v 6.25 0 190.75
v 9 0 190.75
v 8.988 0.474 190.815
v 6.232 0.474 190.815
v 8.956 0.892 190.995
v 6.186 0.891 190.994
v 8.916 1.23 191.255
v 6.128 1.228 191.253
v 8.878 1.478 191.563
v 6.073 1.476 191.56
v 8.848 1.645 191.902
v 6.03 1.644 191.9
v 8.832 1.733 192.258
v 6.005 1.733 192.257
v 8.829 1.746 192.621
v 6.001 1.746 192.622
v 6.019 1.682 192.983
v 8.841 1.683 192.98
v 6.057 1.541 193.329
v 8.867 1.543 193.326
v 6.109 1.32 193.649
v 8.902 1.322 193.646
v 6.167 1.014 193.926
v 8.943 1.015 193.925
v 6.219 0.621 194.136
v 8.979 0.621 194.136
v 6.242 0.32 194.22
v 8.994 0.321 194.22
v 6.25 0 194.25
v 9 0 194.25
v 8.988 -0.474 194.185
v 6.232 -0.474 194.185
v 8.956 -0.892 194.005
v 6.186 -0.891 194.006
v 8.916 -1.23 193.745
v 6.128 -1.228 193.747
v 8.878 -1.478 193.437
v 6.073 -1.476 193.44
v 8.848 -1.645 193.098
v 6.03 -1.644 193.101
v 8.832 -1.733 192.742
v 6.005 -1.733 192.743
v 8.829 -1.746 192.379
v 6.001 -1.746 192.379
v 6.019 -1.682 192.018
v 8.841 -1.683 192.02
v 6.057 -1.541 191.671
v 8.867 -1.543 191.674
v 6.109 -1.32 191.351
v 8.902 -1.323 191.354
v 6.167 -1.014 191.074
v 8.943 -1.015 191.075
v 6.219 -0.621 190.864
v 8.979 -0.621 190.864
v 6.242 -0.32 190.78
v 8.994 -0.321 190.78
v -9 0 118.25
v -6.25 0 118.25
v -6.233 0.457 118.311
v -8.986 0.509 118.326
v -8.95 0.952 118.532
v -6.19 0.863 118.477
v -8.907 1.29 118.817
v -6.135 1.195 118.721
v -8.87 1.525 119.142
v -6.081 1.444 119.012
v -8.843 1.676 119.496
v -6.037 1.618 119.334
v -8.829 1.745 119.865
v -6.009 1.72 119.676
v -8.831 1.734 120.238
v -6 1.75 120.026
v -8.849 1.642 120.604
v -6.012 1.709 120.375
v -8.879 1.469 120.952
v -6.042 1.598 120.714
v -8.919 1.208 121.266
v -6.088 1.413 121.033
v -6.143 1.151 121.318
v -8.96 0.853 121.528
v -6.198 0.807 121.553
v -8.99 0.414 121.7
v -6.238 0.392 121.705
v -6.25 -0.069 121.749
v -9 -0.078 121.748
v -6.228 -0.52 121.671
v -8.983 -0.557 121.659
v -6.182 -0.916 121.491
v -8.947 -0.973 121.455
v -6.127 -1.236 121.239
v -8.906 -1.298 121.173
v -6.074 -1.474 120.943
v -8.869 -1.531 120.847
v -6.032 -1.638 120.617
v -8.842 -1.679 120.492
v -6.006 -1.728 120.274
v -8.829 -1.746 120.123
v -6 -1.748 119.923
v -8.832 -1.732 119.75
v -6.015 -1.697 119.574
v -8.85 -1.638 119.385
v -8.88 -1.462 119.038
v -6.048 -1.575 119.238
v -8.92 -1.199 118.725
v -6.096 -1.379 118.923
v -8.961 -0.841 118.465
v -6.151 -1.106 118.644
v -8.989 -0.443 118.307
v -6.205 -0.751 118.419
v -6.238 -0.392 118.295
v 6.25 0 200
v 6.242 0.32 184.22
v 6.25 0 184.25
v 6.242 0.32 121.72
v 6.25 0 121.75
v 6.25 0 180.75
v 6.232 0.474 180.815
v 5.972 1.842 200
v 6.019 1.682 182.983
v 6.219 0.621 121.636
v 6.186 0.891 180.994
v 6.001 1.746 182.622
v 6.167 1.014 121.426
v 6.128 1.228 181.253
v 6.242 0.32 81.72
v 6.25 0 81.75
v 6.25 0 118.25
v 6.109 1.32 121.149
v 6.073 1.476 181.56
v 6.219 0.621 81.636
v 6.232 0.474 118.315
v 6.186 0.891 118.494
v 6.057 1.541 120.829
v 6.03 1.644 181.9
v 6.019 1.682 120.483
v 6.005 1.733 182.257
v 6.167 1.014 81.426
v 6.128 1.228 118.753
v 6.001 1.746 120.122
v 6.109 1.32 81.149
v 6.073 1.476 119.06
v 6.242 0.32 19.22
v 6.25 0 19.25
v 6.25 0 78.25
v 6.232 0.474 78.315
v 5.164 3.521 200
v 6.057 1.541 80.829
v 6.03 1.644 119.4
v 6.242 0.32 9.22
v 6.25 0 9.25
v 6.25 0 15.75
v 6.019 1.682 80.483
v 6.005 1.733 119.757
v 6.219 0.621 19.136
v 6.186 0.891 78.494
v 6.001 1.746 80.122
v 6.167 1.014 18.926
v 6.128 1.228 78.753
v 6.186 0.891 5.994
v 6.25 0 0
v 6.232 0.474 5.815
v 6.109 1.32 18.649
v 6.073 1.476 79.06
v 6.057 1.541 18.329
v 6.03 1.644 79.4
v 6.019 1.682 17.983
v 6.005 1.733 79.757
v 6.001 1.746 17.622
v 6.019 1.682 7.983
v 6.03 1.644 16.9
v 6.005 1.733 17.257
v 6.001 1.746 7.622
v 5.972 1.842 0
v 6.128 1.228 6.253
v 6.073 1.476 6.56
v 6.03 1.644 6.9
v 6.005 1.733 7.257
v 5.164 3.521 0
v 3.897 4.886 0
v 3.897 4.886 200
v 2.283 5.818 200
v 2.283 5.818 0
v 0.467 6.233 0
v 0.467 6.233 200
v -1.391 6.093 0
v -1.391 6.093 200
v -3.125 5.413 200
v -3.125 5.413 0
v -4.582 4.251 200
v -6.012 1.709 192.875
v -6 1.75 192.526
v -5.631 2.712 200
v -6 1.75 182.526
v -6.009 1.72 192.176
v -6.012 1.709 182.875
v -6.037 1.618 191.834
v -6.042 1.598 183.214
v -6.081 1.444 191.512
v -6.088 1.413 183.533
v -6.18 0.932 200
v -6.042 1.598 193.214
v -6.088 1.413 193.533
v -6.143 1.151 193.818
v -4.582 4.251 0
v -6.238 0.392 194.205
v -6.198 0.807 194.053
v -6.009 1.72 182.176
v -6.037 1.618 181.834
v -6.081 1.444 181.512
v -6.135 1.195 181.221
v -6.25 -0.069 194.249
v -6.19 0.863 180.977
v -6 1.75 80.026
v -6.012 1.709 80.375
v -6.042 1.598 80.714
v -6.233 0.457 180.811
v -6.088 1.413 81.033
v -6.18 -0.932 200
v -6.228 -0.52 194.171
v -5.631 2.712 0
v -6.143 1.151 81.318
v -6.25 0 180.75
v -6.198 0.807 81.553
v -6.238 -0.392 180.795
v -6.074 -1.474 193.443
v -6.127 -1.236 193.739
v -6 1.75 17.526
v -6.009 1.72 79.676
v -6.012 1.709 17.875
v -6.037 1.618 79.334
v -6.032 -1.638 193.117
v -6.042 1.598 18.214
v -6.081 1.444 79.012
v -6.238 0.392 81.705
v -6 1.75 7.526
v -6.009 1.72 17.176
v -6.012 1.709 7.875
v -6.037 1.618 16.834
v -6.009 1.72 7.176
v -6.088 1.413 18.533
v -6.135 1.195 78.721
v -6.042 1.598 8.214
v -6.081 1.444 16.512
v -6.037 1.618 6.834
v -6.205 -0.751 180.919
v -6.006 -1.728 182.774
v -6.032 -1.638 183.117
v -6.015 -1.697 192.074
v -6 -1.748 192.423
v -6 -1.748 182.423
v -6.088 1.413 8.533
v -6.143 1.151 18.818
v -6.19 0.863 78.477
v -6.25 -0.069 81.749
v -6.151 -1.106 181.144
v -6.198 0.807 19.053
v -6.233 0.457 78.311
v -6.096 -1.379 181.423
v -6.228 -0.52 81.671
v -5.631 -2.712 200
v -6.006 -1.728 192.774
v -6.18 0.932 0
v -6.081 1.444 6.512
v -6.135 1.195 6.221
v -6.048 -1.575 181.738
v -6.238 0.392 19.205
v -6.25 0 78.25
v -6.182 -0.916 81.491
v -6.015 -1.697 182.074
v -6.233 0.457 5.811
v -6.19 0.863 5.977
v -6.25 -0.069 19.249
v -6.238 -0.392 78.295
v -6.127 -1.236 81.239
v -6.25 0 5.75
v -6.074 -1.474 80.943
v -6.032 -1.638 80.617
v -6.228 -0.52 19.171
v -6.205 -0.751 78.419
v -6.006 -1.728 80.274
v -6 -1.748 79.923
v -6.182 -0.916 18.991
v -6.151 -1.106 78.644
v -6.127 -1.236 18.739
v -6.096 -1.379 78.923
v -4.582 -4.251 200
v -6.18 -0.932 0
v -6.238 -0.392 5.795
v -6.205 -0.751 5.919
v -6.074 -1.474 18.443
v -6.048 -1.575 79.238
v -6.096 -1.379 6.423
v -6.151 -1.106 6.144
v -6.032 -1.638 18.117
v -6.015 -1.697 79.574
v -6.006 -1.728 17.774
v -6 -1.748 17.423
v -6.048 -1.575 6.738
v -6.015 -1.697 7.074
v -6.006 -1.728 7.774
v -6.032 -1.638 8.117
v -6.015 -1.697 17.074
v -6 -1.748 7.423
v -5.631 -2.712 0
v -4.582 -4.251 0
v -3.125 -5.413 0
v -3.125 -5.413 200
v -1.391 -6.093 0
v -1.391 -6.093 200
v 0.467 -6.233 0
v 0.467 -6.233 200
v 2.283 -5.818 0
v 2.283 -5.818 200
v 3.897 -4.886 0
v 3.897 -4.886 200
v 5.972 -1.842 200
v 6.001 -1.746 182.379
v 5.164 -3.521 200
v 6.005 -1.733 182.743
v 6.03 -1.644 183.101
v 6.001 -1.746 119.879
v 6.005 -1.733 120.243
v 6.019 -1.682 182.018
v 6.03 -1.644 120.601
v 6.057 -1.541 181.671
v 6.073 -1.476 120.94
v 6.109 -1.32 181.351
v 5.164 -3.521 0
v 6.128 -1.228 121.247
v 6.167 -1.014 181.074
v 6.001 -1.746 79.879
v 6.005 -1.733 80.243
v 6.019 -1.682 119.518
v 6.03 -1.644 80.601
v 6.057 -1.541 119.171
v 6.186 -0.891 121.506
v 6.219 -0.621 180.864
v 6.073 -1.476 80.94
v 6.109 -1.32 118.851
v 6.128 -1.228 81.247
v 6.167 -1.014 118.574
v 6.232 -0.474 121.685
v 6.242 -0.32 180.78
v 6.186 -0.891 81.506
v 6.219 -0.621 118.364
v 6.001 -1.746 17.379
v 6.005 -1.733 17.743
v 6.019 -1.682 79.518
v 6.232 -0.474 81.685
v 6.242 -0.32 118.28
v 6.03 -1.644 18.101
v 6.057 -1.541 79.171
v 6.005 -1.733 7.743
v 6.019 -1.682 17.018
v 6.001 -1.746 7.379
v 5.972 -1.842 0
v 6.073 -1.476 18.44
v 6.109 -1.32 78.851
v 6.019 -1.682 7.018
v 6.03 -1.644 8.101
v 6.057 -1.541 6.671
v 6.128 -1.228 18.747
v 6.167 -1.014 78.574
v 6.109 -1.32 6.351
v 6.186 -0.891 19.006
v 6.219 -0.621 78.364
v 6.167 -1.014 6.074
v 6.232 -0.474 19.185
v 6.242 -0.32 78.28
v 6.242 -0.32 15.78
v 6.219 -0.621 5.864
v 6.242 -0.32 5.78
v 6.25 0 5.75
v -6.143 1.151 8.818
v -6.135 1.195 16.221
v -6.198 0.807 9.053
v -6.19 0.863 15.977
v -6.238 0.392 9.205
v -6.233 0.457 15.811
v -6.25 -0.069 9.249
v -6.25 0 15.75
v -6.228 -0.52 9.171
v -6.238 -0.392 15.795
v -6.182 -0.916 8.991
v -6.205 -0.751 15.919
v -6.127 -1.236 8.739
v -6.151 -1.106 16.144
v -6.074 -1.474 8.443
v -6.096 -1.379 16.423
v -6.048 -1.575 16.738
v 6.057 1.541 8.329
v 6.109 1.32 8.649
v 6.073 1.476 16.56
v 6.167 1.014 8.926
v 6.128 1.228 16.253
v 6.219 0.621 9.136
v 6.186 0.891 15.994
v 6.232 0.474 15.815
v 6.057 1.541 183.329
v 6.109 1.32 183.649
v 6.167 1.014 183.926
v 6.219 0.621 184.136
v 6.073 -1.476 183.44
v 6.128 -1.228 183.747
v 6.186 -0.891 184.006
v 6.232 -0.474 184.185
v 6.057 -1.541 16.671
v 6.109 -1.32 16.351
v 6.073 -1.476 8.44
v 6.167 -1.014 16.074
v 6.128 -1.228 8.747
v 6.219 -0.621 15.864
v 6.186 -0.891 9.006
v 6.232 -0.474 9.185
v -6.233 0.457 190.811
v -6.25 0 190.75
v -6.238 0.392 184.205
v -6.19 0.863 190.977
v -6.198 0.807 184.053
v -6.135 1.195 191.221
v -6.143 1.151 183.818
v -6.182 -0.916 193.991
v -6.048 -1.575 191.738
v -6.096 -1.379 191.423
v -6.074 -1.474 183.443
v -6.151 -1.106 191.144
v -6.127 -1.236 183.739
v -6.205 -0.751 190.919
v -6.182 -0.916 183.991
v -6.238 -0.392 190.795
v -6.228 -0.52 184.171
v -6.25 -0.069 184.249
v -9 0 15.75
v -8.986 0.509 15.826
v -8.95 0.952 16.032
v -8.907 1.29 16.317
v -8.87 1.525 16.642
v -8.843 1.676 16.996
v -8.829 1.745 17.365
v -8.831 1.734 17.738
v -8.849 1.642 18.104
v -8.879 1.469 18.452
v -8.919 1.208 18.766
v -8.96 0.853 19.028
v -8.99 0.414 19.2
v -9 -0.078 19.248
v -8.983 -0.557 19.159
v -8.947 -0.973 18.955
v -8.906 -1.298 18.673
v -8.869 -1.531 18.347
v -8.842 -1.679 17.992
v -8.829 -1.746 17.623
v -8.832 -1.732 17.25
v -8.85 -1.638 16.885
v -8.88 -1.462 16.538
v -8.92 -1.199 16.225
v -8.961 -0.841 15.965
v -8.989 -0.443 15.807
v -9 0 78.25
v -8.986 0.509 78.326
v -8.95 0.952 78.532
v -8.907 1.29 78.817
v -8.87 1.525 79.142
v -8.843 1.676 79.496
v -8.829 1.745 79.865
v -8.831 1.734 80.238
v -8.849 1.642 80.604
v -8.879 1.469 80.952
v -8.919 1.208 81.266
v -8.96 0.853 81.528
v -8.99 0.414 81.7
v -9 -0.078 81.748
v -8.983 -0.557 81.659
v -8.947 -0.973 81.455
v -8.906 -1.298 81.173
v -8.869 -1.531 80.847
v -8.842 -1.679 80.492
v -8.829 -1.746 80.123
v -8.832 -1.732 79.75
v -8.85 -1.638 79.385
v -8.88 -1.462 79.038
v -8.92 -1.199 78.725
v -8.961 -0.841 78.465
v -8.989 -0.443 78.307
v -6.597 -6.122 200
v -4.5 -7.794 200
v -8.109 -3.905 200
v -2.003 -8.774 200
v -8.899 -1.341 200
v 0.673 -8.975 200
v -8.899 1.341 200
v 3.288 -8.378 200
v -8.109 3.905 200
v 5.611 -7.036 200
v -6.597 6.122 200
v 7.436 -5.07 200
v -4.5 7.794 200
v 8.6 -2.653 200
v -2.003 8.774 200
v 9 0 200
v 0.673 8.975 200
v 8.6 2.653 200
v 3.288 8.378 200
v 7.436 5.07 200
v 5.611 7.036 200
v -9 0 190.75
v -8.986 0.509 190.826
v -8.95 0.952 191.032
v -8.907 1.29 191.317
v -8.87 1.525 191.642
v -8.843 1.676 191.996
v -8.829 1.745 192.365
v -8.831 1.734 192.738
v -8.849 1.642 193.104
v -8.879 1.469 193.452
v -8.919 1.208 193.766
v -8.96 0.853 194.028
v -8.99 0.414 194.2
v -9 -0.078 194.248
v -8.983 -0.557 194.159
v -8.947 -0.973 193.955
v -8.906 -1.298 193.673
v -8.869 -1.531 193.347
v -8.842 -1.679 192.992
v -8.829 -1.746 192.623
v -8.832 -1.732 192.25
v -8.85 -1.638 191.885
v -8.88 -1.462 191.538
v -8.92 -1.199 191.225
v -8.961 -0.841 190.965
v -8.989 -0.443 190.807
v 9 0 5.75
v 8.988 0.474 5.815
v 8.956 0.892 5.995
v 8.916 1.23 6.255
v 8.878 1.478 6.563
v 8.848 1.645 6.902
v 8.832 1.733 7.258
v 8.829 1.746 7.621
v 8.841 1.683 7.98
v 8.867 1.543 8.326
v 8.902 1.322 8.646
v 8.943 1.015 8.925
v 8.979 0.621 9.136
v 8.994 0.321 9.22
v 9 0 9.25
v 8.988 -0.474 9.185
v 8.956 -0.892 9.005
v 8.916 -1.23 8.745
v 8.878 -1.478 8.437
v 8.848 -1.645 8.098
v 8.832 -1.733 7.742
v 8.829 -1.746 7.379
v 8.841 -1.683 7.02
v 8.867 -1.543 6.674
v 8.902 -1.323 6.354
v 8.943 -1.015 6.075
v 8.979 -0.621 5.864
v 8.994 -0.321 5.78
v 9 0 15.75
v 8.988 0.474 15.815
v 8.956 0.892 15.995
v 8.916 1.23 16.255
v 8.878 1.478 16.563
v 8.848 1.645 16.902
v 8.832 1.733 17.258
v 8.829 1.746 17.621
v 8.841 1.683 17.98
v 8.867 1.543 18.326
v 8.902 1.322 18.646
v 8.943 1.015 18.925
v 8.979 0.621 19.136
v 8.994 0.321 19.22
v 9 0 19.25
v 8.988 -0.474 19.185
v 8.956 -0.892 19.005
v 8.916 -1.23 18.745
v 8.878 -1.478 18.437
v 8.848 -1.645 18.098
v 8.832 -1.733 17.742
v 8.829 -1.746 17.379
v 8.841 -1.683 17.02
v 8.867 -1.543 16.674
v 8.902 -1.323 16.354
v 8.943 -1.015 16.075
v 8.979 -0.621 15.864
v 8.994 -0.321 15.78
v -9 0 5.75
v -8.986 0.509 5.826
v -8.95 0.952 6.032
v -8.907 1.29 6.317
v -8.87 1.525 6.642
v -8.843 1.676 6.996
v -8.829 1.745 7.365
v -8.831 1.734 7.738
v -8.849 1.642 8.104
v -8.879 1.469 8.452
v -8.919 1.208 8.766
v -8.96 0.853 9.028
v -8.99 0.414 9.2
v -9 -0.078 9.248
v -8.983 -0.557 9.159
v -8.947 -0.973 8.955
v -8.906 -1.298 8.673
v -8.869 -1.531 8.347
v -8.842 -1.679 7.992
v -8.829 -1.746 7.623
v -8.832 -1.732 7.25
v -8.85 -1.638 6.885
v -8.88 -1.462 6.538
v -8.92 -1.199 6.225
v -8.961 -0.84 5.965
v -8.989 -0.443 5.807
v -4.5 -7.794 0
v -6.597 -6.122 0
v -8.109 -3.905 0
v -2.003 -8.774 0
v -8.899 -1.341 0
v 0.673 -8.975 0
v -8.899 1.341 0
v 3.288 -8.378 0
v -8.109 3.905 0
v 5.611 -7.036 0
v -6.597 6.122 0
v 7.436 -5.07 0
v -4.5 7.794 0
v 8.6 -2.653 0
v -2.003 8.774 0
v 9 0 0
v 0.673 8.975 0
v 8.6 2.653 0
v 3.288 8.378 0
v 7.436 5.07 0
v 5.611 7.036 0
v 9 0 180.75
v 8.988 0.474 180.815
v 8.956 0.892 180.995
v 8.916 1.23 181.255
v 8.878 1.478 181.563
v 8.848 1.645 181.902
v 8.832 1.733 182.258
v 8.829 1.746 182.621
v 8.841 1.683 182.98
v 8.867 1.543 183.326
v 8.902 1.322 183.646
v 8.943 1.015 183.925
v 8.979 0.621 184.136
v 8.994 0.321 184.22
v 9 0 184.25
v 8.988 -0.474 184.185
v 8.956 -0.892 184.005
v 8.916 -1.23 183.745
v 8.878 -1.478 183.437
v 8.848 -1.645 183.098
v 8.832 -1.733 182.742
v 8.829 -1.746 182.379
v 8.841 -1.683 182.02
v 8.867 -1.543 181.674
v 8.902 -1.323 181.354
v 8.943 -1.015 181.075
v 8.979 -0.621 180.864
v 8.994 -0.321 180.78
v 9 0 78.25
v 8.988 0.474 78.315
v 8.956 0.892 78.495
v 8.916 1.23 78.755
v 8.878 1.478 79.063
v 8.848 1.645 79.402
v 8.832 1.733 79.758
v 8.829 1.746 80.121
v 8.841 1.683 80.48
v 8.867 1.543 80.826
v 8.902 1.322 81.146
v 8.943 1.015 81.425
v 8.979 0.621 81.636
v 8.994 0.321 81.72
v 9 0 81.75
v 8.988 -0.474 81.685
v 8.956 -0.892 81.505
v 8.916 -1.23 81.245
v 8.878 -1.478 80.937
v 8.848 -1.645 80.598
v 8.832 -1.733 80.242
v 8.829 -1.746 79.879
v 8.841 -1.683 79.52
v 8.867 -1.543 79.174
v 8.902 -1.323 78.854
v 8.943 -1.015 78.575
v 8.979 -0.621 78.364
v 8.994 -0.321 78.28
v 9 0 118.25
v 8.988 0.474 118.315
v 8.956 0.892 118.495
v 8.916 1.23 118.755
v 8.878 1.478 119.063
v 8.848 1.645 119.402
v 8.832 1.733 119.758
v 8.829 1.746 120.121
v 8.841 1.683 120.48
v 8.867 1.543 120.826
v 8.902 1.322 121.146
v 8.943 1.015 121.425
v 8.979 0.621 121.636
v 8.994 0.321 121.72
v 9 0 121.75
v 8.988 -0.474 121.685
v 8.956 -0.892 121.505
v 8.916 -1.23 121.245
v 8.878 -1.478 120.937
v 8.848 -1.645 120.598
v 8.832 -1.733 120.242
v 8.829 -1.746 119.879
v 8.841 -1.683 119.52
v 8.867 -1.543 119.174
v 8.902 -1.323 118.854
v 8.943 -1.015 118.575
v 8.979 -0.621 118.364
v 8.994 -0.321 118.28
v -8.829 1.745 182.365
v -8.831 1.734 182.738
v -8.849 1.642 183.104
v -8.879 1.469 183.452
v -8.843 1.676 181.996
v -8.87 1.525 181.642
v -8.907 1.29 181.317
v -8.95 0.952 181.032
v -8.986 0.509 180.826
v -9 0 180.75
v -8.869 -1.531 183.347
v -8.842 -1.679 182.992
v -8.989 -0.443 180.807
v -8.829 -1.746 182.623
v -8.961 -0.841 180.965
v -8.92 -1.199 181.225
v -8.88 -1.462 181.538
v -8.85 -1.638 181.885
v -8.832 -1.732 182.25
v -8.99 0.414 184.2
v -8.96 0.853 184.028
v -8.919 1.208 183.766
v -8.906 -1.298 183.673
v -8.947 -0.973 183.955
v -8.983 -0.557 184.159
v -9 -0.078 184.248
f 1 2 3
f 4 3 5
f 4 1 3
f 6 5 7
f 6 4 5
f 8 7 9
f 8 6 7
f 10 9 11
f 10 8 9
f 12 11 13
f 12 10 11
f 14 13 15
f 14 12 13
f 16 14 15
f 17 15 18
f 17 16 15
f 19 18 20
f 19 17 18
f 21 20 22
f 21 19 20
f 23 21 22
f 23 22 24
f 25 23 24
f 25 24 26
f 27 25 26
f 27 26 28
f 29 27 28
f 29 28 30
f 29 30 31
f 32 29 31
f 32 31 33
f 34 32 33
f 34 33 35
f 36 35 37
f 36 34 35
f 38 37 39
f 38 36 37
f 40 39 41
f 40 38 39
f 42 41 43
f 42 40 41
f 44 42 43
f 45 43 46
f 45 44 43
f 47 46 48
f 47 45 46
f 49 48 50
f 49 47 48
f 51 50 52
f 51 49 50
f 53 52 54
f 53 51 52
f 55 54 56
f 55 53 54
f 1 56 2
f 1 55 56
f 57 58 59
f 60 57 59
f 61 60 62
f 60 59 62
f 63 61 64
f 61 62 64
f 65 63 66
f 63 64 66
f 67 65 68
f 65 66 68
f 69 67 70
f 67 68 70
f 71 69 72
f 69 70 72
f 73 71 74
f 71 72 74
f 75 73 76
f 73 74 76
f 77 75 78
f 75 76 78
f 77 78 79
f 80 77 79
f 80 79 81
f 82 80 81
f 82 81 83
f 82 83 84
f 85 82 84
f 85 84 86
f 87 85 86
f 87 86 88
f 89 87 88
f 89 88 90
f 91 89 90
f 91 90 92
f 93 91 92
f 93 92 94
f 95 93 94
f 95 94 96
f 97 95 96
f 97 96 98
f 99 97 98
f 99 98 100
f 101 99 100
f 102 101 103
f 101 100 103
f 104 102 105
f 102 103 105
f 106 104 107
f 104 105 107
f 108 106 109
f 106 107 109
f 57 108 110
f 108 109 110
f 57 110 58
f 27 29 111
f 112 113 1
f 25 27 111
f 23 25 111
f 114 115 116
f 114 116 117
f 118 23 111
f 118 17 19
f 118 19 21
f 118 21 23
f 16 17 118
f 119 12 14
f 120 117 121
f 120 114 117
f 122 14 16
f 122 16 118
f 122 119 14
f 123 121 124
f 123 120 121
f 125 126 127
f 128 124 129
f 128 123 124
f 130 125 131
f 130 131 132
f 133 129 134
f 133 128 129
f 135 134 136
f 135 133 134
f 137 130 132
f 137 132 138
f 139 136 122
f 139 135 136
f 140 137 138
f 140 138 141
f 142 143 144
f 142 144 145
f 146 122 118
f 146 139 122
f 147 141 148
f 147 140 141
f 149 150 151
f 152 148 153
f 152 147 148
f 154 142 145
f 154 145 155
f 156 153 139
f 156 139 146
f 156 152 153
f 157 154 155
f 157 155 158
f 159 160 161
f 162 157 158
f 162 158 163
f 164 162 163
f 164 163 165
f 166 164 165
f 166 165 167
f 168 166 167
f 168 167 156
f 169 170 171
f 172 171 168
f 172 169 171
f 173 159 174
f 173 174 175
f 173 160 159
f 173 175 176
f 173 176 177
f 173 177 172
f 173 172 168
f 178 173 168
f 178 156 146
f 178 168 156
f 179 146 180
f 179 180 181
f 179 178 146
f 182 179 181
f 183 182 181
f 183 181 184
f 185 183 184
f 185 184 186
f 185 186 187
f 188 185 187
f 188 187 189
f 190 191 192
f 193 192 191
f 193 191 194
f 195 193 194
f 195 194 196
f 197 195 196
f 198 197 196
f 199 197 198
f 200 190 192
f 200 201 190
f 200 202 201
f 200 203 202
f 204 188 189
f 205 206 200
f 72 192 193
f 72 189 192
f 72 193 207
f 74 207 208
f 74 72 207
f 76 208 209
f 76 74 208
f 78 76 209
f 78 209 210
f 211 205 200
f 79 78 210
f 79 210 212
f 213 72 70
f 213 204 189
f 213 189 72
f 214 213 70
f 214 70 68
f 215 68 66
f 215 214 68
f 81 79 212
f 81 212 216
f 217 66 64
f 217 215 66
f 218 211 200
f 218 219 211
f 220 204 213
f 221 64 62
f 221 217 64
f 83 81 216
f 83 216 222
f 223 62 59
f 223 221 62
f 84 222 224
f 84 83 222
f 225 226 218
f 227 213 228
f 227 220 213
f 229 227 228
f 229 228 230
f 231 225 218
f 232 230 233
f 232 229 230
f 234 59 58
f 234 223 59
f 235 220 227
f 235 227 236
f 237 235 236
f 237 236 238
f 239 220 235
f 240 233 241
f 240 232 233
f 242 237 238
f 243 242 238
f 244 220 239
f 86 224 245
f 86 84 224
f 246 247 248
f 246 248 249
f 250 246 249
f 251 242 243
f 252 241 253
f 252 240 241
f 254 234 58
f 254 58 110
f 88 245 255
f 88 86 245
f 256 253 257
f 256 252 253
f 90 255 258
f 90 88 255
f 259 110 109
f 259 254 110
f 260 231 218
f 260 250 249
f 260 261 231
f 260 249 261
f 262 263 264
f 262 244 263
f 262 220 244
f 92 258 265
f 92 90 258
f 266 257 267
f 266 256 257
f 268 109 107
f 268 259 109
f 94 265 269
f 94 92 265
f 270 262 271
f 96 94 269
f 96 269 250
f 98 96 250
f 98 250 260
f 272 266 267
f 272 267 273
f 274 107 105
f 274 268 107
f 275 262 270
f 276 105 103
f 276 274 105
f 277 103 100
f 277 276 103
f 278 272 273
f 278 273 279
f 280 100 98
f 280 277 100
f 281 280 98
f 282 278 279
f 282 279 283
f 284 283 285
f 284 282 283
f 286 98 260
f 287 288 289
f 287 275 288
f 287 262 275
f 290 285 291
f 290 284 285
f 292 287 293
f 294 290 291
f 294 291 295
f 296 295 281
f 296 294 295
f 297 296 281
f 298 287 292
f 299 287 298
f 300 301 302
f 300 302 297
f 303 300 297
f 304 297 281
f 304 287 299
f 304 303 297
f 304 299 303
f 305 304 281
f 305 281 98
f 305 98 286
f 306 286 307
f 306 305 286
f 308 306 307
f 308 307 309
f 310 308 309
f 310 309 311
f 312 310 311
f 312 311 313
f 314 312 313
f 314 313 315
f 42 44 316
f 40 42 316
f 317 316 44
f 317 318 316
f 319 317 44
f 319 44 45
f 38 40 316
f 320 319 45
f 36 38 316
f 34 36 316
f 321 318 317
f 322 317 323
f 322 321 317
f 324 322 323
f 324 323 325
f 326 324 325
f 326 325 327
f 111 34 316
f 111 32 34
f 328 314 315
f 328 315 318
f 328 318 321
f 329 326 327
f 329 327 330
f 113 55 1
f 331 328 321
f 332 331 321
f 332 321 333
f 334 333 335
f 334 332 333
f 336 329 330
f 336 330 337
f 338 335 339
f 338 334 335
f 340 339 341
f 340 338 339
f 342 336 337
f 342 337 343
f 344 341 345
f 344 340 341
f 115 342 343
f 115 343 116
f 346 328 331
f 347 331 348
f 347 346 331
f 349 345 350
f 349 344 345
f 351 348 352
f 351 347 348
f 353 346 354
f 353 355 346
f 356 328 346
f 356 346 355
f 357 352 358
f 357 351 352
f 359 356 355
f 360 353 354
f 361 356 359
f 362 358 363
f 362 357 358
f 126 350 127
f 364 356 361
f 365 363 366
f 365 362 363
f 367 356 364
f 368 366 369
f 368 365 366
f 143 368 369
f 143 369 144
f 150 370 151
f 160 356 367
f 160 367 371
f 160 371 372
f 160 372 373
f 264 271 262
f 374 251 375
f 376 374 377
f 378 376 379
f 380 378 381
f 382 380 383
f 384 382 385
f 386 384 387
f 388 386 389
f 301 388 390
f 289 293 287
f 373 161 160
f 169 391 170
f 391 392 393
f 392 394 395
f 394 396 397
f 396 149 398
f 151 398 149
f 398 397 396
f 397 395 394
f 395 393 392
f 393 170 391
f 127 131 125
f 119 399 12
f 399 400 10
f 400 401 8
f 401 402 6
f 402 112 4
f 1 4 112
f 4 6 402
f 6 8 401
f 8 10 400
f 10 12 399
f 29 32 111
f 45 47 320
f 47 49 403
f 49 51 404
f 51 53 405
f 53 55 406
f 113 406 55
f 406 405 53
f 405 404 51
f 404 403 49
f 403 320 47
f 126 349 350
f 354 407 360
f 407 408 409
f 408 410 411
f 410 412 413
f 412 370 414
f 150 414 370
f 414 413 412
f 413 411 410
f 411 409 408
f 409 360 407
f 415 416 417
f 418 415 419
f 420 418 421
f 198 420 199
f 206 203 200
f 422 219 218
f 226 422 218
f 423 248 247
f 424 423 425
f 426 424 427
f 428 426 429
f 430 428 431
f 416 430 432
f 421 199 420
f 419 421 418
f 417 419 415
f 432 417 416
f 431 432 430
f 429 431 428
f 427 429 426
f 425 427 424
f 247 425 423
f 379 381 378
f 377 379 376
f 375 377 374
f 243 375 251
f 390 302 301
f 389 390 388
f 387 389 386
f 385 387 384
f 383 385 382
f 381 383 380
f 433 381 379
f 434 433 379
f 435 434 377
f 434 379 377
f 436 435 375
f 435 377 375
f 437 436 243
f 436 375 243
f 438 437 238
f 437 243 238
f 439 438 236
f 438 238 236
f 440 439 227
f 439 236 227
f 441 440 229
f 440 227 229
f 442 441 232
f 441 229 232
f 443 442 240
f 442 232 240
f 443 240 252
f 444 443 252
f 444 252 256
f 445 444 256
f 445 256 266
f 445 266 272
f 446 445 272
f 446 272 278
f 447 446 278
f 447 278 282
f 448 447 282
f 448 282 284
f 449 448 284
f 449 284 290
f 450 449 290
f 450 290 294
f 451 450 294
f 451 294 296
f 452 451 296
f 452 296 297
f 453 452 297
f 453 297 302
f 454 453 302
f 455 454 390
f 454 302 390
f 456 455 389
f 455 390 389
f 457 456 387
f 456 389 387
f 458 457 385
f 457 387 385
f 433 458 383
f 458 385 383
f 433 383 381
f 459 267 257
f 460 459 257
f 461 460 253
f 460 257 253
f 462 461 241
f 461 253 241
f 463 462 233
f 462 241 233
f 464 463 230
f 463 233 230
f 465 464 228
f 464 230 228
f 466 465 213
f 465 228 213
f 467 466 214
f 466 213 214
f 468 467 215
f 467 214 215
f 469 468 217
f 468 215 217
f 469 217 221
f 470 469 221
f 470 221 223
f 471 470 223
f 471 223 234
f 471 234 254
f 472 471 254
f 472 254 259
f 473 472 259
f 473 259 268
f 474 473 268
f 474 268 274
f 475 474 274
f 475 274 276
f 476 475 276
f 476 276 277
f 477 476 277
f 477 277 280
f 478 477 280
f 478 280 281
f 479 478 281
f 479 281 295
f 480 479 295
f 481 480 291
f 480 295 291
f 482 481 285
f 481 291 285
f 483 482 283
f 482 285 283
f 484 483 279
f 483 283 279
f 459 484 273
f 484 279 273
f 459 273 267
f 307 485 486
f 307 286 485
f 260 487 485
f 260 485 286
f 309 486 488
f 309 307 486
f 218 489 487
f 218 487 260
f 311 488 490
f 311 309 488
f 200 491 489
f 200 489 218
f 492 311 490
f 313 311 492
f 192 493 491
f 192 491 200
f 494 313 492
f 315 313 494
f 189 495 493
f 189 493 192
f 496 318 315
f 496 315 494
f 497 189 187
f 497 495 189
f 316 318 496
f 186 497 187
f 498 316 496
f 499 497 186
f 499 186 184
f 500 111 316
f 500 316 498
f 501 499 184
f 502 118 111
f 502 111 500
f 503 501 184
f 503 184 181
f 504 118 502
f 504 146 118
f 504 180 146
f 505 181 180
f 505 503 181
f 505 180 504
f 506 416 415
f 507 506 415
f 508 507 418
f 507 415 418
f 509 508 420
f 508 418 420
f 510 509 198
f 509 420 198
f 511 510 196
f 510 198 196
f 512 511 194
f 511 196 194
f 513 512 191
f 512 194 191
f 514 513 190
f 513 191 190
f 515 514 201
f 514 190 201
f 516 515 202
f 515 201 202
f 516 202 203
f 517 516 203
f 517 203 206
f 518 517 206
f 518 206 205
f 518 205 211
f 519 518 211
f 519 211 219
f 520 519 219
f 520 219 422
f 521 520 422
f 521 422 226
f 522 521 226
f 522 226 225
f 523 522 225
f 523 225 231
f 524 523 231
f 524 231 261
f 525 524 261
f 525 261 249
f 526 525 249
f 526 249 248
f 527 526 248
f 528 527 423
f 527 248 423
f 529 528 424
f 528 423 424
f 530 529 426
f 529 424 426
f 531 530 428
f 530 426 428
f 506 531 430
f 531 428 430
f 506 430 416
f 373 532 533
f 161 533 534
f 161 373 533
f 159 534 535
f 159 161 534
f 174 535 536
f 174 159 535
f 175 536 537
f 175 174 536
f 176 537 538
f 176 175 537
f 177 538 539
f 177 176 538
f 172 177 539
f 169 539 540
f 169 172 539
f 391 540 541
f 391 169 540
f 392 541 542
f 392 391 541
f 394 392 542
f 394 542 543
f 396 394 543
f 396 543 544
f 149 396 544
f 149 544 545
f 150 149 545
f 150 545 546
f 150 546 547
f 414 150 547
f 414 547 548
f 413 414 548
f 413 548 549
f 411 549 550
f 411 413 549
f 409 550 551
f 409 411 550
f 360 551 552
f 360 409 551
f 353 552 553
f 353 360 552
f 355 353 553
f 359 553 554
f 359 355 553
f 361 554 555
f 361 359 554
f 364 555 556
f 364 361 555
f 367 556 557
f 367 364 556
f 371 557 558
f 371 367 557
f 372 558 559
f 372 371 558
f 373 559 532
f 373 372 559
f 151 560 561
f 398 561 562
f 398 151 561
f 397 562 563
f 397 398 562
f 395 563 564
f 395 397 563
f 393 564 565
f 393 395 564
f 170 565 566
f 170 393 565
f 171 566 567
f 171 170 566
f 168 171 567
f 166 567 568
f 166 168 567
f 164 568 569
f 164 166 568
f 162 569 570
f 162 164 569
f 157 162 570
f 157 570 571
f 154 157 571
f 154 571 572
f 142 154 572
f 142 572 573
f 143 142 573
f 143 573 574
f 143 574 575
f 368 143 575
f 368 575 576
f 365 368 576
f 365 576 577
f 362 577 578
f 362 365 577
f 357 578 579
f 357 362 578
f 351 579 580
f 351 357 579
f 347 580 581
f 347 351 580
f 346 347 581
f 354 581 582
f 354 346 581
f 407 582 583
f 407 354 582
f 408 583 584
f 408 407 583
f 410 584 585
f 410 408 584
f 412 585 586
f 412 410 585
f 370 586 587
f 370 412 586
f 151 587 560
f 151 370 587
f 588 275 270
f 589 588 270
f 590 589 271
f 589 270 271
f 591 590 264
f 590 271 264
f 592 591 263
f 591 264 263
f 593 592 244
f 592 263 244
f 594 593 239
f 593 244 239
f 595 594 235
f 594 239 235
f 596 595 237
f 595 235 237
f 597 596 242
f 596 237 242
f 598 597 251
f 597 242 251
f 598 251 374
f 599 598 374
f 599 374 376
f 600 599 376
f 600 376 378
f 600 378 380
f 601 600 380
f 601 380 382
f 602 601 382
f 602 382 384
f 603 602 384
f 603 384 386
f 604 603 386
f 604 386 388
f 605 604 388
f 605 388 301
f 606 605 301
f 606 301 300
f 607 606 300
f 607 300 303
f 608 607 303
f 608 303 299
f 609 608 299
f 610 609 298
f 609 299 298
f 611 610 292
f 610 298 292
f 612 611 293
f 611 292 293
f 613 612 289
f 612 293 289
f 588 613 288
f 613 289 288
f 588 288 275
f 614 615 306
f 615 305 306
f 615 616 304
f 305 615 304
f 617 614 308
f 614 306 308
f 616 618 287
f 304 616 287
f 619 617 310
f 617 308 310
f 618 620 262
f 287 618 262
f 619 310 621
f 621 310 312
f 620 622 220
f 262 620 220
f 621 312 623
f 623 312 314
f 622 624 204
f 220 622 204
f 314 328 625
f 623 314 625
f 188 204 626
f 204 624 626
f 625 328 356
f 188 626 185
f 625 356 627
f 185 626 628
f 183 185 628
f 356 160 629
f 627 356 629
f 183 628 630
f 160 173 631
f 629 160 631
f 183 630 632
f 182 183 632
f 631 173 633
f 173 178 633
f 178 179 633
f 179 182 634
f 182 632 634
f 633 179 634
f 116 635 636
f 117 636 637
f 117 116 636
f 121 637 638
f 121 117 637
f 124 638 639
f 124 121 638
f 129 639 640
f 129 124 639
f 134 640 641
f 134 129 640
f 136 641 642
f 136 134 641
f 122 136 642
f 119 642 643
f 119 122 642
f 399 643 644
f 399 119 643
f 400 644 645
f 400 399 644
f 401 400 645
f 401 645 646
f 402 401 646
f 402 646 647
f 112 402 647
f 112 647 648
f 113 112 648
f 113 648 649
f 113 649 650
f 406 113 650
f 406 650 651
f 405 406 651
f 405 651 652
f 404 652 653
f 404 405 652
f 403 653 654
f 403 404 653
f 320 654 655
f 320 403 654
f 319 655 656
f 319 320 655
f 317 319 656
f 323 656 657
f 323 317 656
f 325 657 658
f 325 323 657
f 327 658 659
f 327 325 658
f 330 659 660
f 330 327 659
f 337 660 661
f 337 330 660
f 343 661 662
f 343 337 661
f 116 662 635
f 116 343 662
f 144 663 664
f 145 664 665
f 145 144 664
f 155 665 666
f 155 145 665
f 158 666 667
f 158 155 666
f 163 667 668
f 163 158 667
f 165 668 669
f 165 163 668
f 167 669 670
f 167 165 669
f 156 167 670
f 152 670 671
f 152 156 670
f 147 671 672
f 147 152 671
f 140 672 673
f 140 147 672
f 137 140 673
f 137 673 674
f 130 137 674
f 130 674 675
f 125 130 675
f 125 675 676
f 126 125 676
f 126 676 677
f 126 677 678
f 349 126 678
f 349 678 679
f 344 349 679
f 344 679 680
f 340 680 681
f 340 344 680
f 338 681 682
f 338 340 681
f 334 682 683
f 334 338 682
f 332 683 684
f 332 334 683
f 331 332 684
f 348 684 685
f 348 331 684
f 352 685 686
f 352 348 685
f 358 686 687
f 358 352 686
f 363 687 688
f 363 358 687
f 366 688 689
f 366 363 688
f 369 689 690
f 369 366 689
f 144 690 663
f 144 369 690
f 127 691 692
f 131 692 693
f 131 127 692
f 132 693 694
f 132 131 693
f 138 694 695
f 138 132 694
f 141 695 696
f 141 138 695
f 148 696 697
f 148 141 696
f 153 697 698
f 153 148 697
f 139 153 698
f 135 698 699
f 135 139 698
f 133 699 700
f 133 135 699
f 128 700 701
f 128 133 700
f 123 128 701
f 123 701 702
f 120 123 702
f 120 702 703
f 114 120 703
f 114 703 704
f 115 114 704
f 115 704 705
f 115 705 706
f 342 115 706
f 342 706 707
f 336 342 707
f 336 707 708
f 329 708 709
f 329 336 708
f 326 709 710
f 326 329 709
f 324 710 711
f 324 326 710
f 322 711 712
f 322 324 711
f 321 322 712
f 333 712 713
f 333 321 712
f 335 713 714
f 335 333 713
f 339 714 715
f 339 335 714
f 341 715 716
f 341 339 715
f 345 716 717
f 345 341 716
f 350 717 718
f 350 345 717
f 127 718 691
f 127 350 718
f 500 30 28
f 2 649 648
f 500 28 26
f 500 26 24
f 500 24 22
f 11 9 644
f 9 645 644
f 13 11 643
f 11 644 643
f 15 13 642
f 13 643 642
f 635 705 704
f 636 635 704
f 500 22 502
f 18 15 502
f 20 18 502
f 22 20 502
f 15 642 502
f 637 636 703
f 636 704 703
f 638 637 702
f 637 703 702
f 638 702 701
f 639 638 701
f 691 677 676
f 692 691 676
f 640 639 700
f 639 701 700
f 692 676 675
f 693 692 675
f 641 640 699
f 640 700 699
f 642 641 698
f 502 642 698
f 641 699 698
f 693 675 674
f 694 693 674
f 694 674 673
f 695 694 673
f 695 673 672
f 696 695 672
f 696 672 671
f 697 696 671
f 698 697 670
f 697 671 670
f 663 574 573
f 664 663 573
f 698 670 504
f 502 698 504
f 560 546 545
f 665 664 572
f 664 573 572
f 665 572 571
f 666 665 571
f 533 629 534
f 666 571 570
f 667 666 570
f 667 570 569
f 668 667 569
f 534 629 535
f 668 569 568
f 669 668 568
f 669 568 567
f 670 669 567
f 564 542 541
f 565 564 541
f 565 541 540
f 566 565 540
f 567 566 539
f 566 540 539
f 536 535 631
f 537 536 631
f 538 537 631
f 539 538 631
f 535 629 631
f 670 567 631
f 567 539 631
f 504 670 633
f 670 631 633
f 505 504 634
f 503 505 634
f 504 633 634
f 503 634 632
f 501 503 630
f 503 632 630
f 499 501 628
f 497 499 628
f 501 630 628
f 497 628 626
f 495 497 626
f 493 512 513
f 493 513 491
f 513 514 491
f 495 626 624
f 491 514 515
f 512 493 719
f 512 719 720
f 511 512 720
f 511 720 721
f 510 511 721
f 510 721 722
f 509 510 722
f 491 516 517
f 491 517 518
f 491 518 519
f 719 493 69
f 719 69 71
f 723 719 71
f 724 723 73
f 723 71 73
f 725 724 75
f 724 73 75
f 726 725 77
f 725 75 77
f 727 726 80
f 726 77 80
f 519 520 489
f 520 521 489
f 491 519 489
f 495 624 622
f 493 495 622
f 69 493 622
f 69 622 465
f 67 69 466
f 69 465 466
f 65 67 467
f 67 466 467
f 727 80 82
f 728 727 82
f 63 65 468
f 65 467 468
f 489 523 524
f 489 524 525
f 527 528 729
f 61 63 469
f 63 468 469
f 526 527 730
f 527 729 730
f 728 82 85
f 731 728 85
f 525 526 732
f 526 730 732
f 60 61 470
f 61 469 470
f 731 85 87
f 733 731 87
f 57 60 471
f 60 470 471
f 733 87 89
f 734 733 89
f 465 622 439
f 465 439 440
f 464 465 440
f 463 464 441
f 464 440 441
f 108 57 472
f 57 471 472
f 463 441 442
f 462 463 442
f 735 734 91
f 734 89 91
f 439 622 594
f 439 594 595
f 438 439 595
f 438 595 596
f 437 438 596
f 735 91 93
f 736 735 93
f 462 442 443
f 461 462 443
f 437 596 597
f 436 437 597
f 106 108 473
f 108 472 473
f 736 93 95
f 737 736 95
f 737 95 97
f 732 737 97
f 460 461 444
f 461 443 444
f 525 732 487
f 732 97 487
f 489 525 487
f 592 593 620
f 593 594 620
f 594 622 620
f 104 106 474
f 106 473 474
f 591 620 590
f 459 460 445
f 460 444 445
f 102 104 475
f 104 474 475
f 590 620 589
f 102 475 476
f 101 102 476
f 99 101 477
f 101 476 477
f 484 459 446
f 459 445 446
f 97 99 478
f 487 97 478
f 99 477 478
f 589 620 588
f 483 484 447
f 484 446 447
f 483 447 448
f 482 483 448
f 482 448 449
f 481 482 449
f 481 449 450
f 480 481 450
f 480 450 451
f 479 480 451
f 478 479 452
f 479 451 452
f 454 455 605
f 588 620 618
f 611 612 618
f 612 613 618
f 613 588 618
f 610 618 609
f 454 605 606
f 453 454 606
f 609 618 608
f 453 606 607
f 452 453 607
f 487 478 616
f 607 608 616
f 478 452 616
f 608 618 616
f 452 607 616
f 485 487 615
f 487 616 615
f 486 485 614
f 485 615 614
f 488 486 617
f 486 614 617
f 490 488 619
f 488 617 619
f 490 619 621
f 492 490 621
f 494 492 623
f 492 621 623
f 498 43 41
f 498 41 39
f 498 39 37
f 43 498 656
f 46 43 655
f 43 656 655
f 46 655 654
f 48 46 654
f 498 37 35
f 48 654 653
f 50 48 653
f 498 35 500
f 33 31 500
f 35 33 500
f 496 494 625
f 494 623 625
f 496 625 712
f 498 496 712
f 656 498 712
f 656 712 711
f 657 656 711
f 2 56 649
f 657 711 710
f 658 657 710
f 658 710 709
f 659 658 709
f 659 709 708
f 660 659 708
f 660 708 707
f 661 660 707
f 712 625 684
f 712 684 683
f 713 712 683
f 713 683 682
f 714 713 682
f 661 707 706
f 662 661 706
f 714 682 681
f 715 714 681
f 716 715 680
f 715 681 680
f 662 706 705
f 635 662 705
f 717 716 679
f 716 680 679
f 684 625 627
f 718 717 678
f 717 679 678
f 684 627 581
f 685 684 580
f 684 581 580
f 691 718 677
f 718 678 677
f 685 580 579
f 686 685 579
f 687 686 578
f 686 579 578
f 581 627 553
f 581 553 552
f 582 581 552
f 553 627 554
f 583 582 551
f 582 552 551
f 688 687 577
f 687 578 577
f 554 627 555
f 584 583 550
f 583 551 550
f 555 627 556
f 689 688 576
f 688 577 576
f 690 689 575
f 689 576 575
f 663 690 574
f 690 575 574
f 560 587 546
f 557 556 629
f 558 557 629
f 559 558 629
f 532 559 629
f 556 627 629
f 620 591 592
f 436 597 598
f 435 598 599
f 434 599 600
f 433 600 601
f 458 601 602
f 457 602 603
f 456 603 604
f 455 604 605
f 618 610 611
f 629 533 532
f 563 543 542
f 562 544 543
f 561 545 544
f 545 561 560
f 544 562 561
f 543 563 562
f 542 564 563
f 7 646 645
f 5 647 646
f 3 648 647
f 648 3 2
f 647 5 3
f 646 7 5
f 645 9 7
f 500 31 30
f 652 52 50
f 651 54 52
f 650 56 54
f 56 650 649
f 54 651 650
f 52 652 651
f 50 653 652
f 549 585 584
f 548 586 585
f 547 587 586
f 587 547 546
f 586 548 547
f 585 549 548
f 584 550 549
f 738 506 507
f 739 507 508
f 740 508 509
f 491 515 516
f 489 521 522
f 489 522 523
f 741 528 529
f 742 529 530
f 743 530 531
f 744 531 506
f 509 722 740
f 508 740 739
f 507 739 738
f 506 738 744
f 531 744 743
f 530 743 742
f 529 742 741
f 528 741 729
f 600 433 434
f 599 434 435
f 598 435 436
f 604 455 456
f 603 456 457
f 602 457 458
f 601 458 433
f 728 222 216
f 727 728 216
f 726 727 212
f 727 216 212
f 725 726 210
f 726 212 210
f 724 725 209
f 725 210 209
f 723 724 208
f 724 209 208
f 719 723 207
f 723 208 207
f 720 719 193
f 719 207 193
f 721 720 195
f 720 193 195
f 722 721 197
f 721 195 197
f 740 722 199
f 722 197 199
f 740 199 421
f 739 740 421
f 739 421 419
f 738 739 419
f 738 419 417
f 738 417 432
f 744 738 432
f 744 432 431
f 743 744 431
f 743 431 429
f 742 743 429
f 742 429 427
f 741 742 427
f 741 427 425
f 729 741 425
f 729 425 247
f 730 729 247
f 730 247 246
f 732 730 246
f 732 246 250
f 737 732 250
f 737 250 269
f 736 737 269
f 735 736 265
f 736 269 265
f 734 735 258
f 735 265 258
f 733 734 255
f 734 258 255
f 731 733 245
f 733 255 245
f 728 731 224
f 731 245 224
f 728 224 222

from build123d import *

# Parameters (mm, degrees)
SKETCH_1_R               = 9
SKETCH_1_R_2             = 6.25
EXTRUDE_1_DEPTH          = 200
SKETCH_2_R               = 1.75
CUT_EXTRUDE_1_DEPTH      = 10
CUT_EXTRUDE_1_DEPTH_BACK = 10


with BuildPart() as part:
    # ｽｹｯﾁ1 → ﾎﾞｽ - 押し出し1 (new body)
    with BuildSketch(Plane.XY):
        Circle(SKETCH_1_R)
        Circle(SKETCH_1_R_2, mode=Mode.SUBTRACT)
    extrude(amount=EXTRUDE_1_DEPTH)

    # ｽｹｯﾁ2 → ｶｯﾄ - 押し出し1 (cut, two sides)
    with BuildSketch(Plane(origin=(0, 0, 0), x_dir=(0, 0, -1), z_dir=(1, 0, 0))) as cut_extrude_1_sk:
        with Locations((-7.5, 0)):
            Circle(SKETCH_2_R)
        with Locations((-192.5, 0)):
            Circle(SKETCH_2_R)
        with Locations((-80, 0)):
            Circle(SKETCH_2_R)
        with Locations((-120, 0)):
            Circle(SKETCH_2_R)
        with Locations((-17.5, 0)):
            Circle(SKETCH_2_R)
        with Locations((-182.5, 0)):
            Circle(SKETCH_2_R)
    extrude(amount=CUT_EXTRUDE_1_DEPTH, mode=Mode.SUBTRACT)
    extrude(cut_extrude_1_sk.sketch, amount=-CUT_EXTRUDE_1_DEPTH_BACK, mode=Mode.SUBTRACT)


solid = part.part
